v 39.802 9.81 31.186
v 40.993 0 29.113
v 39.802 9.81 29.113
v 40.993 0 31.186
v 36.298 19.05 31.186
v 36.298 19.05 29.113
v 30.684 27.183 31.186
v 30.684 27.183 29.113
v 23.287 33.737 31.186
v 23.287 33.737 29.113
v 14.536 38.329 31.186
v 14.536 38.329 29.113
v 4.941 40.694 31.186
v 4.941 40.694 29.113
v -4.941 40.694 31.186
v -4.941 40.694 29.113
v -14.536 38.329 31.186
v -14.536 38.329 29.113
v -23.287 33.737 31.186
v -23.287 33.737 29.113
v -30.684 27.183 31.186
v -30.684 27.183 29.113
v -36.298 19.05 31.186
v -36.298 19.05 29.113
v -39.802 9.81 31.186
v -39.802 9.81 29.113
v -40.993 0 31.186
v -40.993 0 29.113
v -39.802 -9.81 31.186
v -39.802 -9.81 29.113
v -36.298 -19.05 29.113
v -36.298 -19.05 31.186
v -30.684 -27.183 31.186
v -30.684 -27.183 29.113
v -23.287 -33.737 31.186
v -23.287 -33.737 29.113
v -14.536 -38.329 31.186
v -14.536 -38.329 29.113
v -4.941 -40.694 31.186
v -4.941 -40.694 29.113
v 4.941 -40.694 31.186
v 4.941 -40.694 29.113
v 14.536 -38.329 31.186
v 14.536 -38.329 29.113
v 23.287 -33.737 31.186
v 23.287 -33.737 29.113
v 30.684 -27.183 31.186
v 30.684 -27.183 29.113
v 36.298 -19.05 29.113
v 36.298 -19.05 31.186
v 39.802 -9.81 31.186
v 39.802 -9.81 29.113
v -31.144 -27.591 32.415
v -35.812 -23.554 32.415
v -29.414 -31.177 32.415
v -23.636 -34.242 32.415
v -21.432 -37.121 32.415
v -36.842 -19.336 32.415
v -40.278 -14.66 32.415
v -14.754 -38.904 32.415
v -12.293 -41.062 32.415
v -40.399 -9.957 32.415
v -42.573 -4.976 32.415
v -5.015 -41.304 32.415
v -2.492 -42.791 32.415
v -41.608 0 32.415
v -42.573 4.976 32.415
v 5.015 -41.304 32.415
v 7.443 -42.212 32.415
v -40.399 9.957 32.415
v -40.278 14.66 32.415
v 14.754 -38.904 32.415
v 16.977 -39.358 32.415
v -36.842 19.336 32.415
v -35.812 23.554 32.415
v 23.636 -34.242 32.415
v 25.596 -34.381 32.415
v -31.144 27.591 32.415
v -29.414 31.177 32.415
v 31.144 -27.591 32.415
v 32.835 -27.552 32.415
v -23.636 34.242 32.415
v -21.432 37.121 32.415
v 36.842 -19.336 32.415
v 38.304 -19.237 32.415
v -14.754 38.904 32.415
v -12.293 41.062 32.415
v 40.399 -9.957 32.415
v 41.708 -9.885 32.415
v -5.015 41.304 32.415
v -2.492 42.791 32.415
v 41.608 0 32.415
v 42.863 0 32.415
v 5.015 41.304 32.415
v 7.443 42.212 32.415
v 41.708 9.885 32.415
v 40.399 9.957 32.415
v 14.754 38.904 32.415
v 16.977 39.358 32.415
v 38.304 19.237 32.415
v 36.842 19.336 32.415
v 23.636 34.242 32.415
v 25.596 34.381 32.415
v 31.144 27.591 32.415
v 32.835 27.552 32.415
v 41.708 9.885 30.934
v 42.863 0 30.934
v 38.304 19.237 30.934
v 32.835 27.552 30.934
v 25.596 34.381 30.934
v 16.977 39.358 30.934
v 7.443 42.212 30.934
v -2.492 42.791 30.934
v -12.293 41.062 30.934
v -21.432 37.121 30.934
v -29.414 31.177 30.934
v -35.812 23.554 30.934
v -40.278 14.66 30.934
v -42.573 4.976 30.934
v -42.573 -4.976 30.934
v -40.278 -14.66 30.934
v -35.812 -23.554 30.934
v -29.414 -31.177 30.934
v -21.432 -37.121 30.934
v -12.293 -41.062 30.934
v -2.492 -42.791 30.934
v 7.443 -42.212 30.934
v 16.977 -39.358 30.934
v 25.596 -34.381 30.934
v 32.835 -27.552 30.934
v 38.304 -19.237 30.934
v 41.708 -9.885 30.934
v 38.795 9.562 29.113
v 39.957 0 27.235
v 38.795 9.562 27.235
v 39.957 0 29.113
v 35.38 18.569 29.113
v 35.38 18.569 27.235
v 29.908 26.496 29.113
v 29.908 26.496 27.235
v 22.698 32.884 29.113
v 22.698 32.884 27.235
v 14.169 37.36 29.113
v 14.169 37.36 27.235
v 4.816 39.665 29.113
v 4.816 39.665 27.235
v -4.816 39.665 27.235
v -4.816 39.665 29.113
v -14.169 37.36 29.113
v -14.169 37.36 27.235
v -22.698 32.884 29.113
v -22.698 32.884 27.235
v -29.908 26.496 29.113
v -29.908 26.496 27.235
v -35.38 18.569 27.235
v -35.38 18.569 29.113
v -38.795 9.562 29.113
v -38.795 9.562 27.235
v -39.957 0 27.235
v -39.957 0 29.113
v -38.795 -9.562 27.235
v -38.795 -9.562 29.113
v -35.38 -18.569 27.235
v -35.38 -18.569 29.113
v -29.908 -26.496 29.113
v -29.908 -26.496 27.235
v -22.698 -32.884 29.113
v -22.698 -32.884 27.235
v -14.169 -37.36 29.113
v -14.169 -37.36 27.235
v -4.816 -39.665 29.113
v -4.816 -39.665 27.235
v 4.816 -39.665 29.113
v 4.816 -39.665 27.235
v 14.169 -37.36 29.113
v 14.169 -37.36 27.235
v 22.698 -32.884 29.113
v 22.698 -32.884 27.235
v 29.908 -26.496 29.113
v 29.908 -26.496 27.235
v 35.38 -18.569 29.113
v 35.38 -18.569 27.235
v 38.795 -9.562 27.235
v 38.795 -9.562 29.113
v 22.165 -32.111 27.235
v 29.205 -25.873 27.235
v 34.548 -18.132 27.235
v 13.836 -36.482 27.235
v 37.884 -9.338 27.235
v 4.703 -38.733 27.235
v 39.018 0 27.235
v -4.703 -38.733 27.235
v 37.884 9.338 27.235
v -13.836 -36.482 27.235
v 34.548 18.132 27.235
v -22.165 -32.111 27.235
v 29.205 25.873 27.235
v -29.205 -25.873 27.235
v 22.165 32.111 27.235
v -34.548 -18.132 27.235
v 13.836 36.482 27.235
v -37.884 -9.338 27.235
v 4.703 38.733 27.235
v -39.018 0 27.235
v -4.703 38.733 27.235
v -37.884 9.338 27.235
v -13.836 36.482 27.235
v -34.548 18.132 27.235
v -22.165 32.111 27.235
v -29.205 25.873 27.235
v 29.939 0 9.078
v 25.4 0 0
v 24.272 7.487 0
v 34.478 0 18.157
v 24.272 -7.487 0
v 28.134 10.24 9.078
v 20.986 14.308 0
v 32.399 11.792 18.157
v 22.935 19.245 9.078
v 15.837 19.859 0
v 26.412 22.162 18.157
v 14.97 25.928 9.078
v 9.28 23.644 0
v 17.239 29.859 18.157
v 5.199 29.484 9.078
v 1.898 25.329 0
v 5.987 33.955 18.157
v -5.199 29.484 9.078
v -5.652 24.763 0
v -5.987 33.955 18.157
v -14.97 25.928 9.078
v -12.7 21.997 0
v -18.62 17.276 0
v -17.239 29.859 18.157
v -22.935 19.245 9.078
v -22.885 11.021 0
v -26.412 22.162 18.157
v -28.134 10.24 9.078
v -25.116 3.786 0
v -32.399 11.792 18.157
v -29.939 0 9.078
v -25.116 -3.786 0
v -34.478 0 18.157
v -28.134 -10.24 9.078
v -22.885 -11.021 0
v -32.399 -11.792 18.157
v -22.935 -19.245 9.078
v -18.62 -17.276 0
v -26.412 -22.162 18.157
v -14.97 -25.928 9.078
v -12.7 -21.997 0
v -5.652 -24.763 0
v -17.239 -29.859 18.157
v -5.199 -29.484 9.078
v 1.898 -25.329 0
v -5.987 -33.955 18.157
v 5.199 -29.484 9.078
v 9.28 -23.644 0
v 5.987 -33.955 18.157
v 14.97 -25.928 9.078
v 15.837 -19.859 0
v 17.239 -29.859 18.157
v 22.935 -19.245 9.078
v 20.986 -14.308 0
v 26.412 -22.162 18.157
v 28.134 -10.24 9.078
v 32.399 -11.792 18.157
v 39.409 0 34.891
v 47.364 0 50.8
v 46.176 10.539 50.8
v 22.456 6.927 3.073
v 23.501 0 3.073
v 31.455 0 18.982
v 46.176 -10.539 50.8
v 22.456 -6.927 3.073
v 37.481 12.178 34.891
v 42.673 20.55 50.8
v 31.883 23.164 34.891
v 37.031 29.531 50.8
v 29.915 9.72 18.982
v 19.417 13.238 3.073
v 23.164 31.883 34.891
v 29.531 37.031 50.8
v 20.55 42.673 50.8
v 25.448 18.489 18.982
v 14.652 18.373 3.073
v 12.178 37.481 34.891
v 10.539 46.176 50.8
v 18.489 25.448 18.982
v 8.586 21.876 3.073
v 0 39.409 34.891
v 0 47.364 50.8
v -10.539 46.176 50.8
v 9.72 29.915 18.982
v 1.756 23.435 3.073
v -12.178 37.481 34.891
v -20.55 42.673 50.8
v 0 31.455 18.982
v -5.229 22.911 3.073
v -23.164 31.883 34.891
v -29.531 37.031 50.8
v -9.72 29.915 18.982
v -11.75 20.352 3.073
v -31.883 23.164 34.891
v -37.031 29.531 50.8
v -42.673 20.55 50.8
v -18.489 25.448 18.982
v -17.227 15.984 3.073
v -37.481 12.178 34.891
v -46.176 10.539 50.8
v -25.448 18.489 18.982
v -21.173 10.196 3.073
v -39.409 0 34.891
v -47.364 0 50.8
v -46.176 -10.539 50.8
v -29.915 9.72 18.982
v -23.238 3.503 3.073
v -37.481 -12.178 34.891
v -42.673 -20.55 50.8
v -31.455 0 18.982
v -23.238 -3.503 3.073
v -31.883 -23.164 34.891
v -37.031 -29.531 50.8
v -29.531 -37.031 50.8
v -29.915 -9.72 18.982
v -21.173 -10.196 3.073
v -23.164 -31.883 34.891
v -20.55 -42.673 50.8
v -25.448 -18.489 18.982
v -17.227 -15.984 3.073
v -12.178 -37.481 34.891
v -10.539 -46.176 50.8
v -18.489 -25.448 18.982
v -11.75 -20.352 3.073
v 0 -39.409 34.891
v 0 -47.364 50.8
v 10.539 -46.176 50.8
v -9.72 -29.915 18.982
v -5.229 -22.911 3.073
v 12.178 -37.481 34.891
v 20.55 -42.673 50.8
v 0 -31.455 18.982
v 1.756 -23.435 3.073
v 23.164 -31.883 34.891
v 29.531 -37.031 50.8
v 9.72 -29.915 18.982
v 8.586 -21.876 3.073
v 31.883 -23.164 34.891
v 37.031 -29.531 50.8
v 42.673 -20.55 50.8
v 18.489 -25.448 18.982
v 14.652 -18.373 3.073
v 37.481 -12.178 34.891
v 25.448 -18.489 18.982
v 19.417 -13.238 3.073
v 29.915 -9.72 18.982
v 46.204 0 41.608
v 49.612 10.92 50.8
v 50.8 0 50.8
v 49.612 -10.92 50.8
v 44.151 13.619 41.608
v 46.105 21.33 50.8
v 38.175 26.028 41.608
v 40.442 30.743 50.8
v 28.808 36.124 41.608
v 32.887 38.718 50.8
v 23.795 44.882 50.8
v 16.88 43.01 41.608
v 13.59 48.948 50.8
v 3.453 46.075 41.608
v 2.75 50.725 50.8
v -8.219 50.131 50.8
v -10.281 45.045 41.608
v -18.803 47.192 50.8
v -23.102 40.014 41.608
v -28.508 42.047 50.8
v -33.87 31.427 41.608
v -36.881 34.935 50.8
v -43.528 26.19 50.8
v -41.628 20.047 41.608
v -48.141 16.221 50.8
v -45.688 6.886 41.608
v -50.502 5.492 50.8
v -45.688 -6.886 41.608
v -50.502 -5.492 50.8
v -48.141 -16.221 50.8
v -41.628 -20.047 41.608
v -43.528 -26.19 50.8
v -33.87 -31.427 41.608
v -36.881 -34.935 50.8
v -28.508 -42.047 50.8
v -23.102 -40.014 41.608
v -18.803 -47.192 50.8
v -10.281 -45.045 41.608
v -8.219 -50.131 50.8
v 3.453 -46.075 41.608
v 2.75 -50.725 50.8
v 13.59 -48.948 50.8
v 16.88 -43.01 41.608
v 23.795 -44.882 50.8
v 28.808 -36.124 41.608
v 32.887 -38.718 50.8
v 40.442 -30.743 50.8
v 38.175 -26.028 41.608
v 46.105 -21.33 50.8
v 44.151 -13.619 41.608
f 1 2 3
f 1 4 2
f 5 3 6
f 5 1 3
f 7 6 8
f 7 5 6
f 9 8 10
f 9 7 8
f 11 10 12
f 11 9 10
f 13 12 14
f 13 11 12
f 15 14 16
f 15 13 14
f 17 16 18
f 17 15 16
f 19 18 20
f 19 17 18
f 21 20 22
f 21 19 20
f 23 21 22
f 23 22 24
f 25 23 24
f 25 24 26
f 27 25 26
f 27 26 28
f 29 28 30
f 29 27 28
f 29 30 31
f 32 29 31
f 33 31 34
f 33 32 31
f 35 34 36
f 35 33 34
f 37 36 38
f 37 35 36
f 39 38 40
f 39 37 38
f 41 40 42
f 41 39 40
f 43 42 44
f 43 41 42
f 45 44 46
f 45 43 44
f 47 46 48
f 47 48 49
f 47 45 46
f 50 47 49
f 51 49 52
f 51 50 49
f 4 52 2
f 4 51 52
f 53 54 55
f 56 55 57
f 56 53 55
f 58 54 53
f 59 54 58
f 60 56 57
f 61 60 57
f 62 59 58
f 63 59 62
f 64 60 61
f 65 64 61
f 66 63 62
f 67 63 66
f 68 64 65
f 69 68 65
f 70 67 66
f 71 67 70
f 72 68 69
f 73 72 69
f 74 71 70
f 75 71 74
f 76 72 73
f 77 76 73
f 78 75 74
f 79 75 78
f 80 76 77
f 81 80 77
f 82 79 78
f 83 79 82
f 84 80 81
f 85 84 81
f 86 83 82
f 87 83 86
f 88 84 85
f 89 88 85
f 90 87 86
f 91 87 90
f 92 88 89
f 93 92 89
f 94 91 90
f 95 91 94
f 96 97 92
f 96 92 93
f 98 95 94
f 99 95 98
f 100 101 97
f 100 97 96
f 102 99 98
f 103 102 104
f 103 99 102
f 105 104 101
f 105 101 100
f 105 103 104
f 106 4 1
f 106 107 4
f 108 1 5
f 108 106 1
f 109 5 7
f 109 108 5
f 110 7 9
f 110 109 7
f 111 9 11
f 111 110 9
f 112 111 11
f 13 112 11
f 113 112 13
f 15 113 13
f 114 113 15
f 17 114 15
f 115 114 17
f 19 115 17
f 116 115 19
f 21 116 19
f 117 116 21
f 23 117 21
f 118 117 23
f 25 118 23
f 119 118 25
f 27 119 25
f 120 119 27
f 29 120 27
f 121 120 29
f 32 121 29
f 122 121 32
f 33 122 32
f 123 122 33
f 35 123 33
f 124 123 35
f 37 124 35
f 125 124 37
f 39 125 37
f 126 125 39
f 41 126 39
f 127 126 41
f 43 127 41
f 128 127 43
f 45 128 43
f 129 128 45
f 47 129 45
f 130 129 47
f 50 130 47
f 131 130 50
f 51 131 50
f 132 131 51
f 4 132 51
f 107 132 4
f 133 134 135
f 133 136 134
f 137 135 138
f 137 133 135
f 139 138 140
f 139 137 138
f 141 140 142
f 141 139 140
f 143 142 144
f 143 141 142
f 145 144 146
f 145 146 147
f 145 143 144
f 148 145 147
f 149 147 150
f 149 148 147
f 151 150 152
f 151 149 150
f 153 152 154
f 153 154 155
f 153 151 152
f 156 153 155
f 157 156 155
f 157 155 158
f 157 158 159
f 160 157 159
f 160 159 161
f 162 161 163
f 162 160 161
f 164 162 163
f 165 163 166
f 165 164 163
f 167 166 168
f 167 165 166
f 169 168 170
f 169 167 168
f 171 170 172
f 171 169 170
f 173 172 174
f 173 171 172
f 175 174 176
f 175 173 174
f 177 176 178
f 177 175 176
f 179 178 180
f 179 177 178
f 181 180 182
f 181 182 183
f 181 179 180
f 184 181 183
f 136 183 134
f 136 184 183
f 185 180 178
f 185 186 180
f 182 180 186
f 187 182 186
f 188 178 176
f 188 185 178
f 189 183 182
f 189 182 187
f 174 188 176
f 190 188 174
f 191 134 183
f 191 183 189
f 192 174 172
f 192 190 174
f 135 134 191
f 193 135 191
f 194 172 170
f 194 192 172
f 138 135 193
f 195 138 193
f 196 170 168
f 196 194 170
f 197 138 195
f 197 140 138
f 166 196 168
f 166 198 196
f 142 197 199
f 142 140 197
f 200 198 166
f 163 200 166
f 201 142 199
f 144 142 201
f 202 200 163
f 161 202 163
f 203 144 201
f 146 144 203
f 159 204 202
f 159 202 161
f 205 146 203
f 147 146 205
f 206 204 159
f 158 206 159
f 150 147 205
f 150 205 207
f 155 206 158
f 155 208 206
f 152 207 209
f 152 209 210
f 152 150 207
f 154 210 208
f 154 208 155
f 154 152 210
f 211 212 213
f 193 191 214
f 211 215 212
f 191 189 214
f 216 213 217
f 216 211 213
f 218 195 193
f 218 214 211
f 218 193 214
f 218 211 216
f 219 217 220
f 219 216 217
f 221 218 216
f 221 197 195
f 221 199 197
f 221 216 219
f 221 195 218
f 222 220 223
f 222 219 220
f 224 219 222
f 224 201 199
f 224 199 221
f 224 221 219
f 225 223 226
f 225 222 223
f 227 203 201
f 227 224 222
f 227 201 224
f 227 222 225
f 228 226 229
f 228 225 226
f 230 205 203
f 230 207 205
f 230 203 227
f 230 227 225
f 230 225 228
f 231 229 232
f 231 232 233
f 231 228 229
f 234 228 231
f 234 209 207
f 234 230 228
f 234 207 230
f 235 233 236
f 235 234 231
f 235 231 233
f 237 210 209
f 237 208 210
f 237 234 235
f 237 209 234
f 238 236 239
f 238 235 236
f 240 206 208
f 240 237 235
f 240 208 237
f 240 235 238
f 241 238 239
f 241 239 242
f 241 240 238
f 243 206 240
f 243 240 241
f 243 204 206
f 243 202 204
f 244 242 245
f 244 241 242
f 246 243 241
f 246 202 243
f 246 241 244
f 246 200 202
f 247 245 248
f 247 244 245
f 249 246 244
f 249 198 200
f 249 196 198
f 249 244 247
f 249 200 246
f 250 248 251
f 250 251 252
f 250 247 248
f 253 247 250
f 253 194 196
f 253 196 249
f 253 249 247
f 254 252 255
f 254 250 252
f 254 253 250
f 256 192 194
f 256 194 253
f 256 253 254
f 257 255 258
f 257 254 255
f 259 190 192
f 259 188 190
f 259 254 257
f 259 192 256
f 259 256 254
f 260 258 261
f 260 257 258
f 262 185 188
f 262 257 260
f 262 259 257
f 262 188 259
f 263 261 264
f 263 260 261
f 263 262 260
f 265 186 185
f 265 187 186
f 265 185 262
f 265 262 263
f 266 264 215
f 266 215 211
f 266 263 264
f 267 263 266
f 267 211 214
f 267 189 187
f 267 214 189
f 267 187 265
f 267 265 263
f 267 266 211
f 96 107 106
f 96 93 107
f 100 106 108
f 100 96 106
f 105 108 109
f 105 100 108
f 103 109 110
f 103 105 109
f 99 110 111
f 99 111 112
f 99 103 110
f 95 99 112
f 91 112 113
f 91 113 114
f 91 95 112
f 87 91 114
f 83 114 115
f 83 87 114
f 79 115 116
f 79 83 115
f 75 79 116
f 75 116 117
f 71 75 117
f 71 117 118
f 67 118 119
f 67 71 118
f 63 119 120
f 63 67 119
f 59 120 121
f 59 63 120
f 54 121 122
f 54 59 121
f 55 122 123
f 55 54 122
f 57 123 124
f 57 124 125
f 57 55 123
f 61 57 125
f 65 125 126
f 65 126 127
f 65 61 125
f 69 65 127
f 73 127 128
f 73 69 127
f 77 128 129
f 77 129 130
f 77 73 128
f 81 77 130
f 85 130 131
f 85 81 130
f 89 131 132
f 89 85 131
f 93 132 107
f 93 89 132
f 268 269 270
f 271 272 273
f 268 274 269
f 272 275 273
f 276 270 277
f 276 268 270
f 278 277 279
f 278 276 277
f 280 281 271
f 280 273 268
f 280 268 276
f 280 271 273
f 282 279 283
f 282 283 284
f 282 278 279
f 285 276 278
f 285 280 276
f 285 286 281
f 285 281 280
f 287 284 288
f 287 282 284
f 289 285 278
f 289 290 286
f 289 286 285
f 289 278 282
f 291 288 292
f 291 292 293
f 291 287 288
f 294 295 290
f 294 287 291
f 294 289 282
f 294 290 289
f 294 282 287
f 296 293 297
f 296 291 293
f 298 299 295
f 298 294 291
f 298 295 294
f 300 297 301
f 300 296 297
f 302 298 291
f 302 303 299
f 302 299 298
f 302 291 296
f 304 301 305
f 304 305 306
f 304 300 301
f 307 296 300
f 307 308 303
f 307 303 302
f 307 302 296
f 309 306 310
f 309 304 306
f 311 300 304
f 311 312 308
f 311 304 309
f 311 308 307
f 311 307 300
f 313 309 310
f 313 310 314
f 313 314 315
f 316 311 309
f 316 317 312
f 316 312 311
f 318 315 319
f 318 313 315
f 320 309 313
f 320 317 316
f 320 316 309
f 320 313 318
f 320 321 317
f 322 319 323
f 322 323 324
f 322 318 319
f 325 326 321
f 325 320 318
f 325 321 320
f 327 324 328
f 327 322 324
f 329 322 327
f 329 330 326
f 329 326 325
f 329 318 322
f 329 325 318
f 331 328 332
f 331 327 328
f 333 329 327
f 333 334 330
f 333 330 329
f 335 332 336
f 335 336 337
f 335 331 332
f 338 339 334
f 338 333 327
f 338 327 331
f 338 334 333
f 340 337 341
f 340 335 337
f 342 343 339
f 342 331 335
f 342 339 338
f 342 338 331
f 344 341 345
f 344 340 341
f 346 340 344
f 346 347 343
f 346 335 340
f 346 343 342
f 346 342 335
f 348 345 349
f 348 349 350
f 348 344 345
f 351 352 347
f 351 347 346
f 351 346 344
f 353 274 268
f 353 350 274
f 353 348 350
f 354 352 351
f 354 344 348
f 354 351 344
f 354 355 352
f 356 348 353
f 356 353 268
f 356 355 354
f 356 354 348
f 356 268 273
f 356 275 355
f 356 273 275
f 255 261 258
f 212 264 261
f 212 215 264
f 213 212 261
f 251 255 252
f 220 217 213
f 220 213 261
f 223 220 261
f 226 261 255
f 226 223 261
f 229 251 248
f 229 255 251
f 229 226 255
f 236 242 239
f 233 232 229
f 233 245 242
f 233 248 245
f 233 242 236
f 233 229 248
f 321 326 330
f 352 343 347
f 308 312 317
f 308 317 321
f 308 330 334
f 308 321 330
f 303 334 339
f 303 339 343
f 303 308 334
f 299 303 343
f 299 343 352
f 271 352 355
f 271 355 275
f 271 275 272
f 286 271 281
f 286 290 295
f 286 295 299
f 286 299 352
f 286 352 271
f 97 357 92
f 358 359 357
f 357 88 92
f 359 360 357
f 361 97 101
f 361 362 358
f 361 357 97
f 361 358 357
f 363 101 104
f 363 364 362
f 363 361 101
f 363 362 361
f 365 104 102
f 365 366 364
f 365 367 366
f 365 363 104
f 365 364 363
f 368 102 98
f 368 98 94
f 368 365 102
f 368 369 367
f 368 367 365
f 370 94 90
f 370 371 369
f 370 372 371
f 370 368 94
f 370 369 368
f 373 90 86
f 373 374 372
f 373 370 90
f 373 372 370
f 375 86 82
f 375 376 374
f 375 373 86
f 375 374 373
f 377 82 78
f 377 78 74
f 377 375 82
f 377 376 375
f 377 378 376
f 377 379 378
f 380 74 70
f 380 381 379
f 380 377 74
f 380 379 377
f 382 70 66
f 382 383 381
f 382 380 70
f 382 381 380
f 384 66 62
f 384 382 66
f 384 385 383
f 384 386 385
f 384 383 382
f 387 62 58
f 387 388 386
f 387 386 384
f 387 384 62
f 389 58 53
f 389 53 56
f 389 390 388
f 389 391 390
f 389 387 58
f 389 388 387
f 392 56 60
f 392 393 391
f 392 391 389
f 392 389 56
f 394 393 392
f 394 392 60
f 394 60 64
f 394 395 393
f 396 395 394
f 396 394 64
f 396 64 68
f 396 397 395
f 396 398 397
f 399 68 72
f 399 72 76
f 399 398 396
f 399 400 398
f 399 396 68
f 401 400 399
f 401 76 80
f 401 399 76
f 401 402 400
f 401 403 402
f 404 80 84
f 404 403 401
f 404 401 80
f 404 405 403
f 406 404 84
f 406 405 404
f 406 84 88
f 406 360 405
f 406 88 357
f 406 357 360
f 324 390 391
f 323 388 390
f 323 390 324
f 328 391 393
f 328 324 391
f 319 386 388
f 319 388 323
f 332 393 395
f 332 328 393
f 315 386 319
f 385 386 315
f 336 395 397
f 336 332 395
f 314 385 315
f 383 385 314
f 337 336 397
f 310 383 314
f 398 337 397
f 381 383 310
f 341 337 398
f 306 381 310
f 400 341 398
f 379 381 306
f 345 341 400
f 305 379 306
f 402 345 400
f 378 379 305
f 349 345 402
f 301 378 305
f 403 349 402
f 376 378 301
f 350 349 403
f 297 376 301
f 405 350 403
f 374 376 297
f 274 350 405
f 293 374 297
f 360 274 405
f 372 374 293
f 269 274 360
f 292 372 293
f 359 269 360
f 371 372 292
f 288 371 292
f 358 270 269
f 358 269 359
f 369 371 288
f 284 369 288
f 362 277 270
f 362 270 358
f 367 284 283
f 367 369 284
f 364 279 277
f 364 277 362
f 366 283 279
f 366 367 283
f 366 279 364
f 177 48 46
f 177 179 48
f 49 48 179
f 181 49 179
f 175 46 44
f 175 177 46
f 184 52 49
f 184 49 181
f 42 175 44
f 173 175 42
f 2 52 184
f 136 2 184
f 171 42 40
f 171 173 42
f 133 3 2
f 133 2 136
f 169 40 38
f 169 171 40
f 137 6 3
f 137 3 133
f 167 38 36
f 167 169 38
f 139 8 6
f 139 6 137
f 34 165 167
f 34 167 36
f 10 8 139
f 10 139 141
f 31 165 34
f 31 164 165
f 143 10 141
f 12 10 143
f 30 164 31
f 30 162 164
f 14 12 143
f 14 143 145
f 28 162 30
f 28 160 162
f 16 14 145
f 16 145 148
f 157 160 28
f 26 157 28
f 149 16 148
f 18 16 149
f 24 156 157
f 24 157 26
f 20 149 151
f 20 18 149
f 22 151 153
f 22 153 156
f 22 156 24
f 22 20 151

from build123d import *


with BuildPart() as f1:
    # F0 (on Front) → F1 (revolve)
    with BuildSketch(Plane.XZ):
        Polygon((0, 3.0734), (0, 0), (25.4, 0), (39.01757, 27.235139), (39.956536, 29.113071), (40.993106, 31.186212), (41.607701, 32.415403), (50.8, 50.8), (47.363834, 50.8), (23.500534, 3.0734), align=None)
        Polygon((41.607701, 32.415403), (40.993106, 31.186212), (42.863108, 30.934094), (42.863108, 32.415403), align=None)
        Polygon((40.993106, 31.186212), (39.956536, 29.113071), (40.993106, 29.113071), align=None)
        Polygon((39.956536, 29.113071), (39.01757, 27.235139), (39.956536, 27.235139), align=None)
    revolve(axis=Axis((0, 0, 25.4), (0, 0, 1)))


solid = f1.part
